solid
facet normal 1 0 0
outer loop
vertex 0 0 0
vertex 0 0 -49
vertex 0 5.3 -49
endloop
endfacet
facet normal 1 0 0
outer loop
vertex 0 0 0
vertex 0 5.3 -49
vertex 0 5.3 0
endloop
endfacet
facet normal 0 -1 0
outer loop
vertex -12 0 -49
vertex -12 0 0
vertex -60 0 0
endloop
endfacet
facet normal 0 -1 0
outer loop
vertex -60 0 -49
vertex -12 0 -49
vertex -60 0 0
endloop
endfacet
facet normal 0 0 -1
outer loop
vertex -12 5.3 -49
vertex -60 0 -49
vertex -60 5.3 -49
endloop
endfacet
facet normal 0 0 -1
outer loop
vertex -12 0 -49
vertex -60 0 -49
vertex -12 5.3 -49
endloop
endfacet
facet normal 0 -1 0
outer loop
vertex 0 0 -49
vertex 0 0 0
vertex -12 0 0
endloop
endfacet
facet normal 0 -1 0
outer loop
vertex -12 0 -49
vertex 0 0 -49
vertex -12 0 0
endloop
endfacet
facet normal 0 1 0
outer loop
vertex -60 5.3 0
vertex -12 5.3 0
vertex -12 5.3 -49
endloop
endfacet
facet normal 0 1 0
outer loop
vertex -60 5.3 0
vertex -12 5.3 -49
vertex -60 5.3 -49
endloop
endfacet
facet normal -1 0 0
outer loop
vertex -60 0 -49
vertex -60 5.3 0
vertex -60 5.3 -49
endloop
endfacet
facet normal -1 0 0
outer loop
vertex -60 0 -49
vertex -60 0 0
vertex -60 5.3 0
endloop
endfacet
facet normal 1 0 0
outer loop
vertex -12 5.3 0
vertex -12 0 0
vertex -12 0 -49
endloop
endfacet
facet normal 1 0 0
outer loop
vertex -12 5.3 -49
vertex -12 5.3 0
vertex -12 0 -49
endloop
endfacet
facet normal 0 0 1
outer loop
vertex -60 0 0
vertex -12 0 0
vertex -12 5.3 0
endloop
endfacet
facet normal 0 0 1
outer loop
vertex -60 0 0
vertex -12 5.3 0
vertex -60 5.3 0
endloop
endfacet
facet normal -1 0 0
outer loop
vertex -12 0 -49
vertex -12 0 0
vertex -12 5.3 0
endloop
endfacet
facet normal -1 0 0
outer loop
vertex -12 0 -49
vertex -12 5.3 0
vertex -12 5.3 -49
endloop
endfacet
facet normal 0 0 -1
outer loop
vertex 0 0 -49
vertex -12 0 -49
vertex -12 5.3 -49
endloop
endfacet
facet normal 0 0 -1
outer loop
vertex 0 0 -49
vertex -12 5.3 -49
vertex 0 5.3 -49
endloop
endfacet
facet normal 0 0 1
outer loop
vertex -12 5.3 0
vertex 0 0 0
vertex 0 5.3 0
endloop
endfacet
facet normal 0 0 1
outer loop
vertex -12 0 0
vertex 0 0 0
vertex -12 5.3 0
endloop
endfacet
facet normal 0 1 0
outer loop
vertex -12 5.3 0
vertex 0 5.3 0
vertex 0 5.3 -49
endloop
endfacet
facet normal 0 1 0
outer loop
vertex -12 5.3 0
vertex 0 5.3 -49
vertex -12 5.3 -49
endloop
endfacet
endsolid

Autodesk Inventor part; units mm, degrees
ref_plane "YZ Plane" through (0, 0, 0) normal (1, 0, 0) x (0, 1, 0)
ref_plane "XZ Plane" through (0, 0, 0) normal (0, 1, 0) x (-1, 0, 0)
ref_plane "XY Plane" through (0, 0, 0) normal (0, 0, 1) x (1, 0, 0)
sketch "Sketch1" plane through (0, 0, 0) normal (0, 1, 0) x (-1, 0, 0)
  line L0 (0, 0) -> (60, 0)
  line L1 (60, 0) -> (60, -49)
  line L2 (60, -49) -> (0, -49)
  line L3 (0, -49) -> (0, 0)
  dimension "d0" = 60
  dimension "d1" = 49
extrude "Extrusion1" add sketch "Sketch1" along normal blind 5.3
sketch "Sketch2" plane through (0, 5.3, 0) normal (0, 1, 0) x (1, 0, 0)
  line L0 (-60, 0) -> (0, 0) projected
  line L1 (-12, 0) -> (-12, 49)
  line L2 (0, 49) -> (-60, 49) projected
  line L3 (0, 0) -> (0, 49) projected
  dimension "d4" = 12
split body "Split1" sketch "Sketch2" result two bodies curves L1 first body at (-44, 0.5, -32.6667)
sketch "Sketch3" plane through (0, 0, -49) normal (0, 0, -1) x (-1, 0, 0)
  circle A0 centre (1, 4.3) radius 0.75
  circle A1 centre (1, 1) radius 0.75
  line L0 (0, 0) -> (0, 5.3) projected
  line L1 (0, 5.3) -> (12, 5.3) projected
  line L2 (0, 0) -> (12, 0) projected
  dimension "d5" = 1
  dimension "d6" = 1
  dimension "d7" = 1.5
  dimension "d8" = 1.5
  dimension "d9" = 1
  dimension "d10" = 1
properties part number "bateria"
